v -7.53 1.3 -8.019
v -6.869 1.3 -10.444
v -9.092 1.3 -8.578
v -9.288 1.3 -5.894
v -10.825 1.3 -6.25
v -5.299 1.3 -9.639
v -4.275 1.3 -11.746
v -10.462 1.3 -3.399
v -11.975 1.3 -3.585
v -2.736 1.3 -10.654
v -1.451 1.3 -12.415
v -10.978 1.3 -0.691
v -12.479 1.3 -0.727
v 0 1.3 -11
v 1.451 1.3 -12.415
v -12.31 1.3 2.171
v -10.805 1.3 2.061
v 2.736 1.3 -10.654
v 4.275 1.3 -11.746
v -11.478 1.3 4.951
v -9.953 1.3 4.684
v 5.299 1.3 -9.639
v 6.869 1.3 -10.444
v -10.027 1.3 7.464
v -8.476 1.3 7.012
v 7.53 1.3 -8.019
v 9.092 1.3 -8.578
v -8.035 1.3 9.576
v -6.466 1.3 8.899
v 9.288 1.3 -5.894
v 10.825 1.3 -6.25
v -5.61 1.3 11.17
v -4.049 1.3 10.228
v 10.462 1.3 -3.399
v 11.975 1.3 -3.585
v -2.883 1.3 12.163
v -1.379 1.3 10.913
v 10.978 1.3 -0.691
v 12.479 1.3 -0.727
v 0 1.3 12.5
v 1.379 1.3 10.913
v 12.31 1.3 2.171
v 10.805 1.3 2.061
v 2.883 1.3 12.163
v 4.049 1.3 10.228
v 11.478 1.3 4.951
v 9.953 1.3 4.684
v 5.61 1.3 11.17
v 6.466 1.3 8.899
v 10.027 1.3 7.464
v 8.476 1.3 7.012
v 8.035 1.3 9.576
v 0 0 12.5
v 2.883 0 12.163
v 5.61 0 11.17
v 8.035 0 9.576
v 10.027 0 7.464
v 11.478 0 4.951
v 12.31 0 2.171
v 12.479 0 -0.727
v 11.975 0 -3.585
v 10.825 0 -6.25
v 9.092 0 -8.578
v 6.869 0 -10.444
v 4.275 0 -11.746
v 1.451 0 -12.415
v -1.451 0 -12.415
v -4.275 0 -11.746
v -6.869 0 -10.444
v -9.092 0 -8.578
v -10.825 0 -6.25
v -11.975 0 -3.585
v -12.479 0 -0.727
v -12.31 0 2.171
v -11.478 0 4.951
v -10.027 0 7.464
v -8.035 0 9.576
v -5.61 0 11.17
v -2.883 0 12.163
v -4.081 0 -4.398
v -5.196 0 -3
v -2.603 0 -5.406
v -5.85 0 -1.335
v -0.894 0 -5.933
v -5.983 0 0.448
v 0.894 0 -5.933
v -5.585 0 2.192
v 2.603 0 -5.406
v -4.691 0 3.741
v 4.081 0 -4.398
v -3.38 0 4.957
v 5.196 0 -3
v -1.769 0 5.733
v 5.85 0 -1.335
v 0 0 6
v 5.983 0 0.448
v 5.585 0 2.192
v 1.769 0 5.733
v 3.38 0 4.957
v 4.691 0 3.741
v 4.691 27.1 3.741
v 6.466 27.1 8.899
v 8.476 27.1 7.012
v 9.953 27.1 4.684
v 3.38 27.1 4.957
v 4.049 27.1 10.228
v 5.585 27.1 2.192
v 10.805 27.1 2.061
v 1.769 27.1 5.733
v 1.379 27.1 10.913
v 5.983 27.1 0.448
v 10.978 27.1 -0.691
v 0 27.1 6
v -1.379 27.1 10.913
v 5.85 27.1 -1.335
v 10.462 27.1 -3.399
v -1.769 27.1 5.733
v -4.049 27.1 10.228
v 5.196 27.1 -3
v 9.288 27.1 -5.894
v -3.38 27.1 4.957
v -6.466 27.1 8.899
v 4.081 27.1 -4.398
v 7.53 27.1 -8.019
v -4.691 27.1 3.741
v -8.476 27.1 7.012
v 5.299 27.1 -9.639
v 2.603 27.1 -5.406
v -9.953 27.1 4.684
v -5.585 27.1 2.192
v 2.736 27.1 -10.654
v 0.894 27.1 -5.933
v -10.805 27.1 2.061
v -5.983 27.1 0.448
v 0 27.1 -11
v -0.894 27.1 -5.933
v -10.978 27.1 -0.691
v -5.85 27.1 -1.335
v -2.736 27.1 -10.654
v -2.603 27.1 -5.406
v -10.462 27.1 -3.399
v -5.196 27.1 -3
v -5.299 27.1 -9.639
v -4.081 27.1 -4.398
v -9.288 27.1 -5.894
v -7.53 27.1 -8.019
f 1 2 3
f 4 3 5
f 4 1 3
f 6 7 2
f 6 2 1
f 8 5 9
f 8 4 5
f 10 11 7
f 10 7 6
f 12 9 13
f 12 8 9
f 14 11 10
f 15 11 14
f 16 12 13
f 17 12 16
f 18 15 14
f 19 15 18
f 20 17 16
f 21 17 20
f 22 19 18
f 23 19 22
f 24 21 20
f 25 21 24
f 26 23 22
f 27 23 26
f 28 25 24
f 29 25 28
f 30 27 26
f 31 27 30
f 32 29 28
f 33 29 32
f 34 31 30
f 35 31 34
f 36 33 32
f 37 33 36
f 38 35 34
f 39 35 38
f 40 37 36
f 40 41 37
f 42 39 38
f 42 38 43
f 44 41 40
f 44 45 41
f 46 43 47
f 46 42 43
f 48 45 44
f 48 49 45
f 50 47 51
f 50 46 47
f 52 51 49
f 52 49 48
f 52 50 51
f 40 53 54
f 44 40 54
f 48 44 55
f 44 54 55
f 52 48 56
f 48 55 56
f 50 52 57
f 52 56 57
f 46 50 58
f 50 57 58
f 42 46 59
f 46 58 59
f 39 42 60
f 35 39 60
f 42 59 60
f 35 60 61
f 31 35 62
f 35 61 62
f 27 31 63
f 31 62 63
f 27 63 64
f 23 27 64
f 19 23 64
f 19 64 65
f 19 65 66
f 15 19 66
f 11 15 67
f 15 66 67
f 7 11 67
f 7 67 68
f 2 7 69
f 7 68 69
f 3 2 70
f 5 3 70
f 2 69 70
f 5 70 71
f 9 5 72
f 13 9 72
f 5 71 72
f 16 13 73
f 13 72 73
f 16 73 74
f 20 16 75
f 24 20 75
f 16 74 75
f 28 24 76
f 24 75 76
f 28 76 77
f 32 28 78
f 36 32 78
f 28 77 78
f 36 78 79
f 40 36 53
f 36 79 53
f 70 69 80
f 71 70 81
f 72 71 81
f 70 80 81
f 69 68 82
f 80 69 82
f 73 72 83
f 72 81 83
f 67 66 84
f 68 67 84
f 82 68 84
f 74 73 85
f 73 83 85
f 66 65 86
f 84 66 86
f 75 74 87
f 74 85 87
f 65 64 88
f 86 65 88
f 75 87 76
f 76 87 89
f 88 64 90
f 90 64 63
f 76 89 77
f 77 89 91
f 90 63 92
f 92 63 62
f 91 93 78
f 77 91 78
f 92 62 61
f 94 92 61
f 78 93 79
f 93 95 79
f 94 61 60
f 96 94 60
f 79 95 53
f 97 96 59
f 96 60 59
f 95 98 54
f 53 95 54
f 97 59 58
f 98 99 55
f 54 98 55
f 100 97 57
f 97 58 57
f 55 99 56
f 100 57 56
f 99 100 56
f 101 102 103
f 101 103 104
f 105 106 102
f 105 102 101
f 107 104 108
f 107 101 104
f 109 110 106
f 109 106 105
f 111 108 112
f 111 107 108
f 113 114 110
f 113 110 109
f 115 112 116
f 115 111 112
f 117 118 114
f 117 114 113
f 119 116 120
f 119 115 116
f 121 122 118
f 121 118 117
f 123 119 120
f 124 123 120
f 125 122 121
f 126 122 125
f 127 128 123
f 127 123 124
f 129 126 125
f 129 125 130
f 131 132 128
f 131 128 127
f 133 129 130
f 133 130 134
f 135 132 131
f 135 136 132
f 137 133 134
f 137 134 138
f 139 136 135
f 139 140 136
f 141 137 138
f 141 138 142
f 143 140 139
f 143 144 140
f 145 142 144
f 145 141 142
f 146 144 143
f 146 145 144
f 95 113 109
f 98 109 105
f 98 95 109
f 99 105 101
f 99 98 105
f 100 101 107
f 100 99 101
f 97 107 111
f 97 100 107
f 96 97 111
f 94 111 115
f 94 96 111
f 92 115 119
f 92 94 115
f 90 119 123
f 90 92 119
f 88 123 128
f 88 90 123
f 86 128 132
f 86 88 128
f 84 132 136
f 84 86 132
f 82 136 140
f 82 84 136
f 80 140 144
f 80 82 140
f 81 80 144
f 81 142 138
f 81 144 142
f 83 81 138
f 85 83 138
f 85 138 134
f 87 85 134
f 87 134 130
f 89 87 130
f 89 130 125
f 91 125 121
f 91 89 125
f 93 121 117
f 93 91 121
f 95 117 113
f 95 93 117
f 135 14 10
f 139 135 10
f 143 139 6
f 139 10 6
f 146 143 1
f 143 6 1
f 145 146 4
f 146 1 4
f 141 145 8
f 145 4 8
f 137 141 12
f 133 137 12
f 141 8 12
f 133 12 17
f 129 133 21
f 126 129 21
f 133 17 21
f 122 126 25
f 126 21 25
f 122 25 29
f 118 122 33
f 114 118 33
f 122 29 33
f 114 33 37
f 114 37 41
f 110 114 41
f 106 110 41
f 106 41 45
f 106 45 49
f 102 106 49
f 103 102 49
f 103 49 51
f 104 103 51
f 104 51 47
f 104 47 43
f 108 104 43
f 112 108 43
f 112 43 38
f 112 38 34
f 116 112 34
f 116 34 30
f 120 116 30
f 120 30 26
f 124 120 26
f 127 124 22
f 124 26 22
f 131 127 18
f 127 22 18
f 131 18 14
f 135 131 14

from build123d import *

# Parameters (mm, degrees)
SKETCH1_R           = 11
BOSS_EXTRUDE1_DEPTH = 27.1
SKETCH2_R           = 12.5
BOSS_EXTRUDE2_DEPTH = 1.3
SKETCH3_R           = 6
CUT_EXTRUDE1_DEPTH  = 29.3


with BuildPart() as part:
    # Sketch1 → Boss-Extrude1 (new body)
    with BuildSketch(Plane(origin=(0, 0, 0), x_dir=(1, 0, 0), z_dir=(0, 1, 0))):
        with Locations(Location((0, 0, 0), (0, 0, 90))):
            Circle(SKETCH1_R)
    extrude(amount=BOSS_EXTRUDE1_DEPTH)

    # Sketch2 → Boss-Extrude2 (add)
    with BuildSketch(Plane(origin=(0, 0, 0), x_dir=(1, 0, 0), z_dir=(0, 1, 0))):
        with Locations(Location((0, 0, 0), (0, 0, 270))):
            Circle(SKETCH2_R)
    extrude(amount=BOSS_EXTRUDE2_DEPTH)

    # Sketch3 → Cut-Extrude1 (cut)
    with BuildSketch(Plane(origin=(0, 0, 0), x_dir=(1, 0, 0), z_dir=(0, 1, 0))):
        with Locations(Location((0, 0, 0), (0, 0, 270))):
            Circle(SKETCH3_R)
    extrude(amount=CUT_EXTRUDE1_DEPTH, mode=Mode.SUBTRACT)


solid = part.part
